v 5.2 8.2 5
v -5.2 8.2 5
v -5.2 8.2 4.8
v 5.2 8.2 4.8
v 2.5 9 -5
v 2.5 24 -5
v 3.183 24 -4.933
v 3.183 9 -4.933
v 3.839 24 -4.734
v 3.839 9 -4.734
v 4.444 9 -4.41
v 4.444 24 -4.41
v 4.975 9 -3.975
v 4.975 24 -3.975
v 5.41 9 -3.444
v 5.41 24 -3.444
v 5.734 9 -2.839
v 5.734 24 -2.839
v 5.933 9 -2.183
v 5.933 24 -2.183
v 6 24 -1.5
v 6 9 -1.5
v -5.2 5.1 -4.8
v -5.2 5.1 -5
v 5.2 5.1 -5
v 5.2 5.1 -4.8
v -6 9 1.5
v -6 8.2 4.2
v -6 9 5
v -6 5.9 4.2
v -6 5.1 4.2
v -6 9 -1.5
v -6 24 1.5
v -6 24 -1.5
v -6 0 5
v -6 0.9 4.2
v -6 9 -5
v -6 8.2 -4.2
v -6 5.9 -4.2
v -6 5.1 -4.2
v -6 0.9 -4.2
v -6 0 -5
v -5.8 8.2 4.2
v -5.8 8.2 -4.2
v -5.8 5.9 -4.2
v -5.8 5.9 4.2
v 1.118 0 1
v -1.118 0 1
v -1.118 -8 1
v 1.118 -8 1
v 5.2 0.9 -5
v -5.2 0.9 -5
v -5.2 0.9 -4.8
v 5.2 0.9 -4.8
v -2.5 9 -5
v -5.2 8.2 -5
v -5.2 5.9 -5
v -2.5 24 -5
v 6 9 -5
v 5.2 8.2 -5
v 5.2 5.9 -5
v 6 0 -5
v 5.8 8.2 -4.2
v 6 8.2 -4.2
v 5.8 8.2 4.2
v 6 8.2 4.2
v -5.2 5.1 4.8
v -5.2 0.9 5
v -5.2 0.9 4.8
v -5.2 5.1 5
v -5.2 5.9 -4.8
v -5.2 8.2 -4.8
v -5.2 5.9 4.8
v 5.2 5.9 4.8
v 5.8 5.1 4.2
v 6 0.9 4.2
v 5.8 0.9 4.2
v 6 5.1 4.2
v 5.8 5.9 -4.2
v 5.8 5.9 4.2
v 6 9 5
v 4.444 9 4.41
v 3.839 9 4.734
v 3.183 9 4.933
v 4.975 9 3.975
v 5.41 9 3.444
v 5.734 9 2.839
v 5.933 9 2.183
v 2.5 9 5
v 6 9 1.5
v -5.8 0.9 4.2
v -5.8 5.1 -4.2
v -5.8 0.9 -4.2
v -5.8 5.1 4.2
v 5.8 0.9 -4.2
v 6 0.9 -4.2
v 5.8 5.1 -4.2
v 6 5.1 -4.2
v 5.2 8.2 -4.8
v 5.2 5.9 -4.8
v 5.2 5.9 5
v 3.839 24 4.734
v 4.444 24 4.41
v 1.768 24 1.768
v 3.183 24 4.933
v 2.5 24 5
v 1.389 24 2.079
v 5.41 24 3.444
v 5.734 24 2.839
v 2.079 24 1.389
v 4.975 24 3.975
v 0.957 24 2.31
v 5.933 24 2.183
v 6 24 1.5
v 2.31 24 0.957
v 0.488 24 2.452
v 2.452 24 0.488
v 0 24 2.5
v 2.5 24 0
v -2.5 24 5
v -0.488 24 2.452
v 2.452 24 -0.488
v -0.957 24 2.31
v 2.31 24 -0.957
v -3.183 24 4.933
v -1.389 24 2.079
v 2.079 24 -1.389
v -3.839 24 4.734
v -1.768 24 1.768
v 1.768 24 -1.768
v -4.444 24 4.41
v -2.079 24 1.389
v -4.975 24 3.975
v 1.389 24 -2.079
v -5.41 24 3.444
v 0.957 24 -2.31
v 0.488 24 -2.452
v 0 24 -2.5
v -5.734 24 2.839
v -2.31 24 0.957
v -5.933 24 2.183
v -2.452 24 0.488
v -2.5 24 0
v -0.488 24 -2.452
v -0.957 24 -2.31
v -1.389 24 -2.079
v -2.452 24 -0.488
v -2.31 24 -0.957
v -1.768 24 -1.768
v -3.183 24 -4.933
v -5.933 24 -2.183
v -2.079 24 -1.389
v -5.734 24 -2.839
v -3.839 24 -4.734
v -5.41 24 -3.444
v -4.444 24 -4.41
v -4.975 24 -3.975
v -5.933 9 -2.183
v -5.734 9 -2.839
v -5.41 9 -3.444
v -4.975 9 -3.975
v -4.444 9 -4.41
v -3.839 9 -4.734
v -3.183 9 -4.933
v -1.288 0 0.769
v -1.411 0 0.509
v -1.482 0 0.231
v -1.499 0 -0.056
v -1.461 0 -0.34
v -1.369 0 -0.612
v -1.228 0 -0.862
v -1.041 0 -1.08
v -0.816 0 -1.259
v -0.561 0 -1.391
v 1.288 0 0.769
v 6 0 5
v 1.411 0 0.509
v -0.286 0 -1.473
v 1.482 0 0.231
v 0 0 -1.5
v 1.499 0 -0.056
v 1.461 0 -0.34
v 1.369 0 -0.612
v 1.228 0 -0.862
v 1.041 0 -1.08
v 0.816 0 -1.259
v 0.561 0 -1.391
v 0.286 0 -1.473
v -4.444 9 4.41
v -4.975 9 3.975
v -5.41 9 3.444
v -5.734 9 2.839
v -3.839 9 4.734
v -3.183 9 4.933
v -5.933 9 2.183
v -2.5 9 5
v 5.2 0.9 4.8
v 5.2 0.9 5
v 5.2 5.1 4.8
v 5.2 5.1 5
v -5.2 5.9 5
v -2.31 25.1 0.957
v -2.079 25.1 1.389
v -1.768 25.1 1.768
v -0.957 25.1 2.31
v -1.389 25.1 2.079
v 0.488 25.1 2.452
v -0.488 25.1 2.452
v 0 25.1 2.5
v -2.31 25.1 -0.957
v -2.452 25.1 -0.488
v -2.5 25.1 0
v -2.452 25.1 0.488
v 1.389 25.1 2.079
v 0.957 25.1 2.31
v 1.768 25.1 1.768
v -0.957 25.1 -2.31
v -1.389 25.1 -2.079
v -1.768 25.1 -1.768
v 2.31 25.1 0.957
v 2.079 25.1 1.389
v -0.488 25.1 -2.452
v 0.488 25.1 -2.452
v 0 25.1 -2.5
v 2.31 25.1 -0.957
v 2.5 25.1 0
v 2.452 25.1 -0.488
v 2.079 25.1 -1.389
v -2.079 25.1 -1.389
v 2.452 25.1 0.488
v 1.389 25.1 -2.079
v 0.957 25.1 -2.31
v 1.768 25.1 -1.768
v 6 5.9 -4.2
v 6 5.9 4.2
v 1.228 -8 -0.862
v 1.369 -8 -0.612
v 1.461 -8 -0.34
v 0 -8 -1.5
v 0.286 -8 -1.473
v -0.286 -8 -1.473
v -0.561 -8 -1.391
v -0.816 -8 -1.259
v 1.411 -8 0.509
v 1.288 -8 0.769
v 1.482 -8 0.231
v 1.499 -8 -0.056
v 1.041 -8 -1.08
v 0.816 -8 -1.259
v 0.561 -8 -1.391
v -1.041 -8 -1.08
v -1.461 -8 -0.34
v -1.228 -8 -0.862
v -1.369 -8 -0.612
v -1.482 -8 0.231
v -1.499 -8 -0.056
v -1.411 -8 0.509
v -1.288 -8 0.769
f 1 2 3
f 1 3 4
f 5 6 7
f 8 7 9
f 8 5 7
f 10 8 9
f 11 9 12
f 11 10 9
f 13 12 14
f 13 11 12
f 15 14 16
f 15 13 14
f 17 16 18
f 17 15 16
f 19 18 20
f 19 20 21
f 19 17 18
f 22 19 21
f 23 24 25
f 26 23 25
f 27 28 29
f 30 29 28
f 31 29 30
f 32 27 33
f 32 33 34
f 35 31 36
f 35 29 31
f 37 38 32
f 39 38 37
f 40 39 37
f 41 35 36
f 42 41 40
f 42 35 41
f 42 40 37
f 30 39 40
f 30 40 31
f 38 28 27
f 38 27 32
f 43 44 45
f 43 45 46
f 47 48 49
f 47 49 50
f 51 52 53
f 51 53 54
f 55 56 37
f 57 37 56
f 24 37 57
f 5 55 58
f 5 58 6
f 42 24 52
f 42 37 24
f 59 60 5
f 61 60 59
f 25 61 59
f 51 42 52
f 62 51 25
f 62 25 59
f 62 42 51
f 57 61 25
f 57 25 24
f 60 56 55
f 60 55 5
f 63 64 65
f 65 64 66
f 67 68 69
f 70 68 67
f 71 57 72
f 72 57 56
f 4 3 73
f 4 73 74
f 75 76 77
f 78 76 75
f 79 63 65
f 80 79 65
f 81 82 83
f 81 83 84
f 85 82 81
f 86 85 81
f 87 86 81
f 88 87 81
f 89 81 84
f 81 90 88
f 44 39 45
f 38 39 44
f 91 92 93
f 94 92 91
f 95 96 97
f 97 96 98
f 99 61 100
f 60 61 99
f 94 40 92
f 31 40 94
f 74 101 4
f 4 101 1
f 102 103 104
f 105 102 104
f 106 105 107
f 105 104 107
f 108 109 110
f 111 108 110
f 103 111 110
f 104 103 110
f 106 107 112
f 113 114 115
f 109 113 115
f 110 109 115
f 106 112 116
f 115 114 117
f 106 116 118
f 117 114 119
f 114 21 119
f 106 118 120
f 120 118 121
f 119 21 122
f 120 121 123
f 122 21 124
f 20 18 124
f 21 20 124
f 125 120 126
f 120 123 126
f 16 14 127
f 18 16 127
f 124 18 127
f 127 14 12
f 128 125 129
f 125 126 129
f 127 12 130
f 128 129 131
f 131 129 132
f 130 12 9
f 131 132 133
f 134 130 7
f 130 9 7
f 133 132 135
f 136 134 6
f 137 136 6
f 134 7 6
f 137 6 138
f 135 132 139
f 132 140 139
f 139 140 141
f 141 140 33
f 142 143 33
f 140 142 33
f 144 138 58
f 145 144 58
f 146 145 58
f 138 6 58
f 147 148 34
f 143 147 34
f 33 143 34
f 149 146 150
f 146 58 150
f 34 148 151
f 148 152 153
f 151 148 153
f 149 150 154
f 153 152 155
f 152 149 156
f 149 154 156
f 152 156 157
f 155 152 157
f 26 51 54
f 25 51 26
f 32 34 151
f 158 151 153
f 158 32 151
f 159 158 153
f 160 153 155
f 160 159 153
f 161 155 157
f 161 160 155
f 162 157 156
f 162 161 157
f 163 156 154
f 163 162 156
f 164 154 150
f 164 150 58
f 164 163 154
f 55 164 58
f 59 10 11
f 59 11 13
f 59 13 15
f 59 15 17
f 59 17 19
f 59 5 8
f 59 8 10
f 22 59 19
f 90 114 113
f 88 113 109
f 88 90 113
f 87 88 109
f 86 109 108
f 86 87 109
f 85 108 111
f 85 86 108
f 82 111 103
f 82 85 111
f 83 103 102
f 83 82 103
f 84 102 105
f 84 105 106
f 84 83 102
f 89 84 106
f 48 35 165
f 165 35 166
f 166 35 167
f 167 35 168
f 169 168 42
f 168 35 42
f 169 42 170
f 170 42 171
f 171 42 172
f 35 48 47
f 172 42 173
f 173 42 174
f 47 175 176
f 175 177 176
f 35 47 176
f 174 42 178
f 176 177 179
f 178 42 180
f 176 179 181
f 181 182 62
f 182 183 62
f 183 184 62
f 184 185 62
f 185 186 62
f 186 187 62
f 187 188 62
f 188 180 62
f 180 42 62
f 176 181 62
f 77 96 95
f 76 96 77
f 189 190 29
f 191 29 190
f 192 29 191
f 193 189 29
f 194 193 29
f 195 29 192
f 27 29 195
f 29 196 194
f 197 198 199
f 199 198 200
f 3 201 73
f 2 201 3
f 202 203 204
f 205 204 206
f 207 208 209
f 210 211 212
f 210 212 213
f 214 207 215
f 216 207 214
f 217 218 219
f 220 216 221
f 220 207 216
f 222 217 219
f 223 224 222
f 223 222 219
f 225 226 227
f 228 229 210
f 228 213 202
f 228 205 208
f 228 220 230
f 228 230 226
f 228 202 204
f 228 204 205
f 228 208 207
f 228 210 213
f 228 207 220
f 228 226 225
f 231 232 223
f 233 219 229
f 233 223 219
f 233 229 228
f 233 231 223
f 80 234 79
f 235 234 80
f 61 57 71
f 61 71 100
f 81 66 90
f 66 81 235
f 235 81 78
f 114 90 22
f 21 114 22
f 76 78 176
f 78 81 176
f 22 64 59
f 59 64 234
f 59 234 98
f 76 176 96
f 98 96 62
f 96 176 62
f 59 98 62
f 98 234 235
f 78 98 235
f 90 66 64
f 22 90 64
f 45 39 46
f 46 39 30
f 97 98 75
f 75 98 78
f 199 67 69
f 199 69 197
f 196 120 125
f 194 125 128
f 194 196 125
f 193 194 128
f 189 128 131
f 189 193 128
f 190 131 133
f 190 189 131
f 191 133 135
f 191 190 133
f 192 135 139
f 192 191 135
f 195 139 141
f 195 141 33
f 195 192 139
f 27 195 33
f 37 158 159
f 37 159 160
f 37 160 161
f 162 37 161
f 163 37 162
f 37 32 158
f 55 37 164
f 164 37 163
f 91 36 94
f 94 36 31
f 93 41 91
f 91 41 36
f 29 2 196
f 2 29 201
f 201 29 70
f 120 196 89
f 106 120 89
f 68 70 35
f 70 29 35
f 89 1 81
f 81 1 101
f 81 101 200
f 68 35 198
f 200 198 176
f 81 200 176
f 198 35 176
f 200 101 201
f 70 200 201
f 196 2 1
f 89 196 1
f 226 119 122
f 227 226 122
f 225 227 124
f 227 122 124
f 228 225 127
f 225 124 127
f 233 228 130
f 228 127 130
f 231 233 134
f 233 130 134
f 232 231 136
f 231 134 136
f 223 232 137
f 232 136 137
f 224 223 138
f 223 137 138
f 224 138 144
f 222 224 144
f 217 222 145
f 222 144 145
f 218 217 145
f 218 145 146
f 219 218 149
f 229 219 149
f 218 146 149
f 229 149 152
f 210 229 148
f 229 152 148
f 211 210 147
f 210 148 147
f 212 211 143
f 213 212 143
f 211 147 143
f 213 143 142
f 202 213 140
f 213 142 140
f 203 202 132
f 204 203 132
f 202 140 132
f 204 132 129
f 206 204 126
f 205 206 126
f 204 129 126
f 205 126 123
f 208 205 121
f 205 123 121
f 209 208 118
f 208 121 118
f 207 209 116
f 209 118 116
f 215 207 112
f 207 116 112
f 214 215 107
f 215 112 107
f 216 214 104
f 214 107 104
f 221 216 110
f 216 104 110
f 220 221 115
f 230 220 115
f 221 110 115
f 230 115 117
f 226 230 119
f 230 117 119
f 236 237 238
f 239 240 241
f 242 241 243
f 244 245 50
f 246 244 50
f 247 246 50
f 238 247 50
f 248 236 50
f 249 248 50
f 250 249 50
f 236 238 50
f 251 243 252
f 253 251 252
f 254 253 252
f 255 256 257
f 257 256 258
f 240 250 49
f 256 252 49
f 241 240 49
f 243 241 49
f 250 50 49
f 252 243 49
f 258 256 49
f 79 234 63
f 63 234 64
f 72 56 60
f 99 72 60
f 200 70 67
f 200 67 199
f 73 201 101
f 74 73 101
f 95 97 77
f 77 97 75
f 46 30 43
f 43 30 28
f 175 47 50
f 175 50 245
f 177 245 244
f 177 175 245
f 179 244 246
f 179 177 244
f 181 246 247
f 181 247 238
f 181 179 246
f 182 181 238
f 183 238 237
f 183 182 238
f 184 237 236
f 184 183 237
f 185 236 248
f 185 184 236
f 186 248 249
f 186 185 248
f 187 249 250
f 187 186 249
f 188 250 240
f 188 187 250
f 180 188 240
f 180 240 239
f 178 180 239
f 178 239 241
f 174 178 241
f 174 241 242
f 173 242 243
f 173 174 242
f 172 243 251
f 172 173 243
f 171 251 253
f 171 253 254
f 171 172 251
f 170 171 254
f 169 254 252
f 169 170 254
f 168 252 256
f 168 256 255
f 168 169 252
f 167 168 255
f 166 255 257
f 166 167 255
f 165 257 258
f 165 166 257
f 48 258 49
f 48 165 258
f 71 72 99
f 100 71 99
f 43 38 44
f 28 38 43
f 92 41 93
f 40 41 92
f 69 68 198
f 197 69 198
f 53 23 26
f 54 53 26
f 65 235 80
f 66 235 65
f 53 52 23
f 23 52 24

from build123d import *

# Parameters (mm, degrees)
SKETCH1_W           = 12
SKETCH1_H           = 10
BOSS_EXTRUDE1_DEPTH = 9
BOSS_EXTRUDE2_DEPTH = 15
SKETCH3_R           = 2.5
BOSS_EXTRUDE3_DEPTH = 1.1
BOSS_EXTRUDE4_DEPTH = 8
SKETCH5_W           = 10.4
SKETCH5_H           = 2.3
SKETCH5_H_2         = 4.2
CUT_EXTRUDE1_DEPTH  = 0.2
SKETCH6_W           = 8.4
SKETCH6_H           = 2.3
SKETCH6_H_2         = 4.2
CUT_EXTRUDE2_DEPTH  = 0.2


with BuildPart() as part:
    # Sketch1 → Boss-Extrude1 (new body)
    with BuildSketch(Plane(origin=(0, 0, 0), x_dir=(1, 0, 0), z_dir=(0, 1, 0))):
        Rectangle(SKETCH1_W, SKETCH1_H)
    extrude(amount=BOSS_EXTRUDE1_DEPTH)

    # Sketch2 → Boss-Extrude2 (add)
    with BuildSketch(Plane(origin=(0, 9, 0), x_dir=(1, 0, 0), z_dir=(0, 1, 0))):
        with BuildLine():
            Line((-2.5, 5), (2.5, 5))
            ThreePointArc((2.5, 5), (4.974873734, 3.974873734), (6, 1.5))
            Line((6, 1.5), (6, -1.5))
            ThreePointArc((6, -1.5), (4.974873734, -3.974873734), (2.5, -5))
            Line((2.5, -5), (-2.5, -5))
            ThreePointArc((-2.5, -5), (-4.974873734, -3.974873734), (-6, -1.5))
            Line((-6, -1.5), (-6, 1.5))
            ThreePointArc((-6, 1.5), (-4.974873734, 3.974873734), (-2.5, 5))
        make_face()
    extrude(amount=BOSS_EXTRUDE2_DEPTH)

    # Sketch3 → Boss-Extrude3 (add)
    with BuildSketch(Plane(origin=(0, 24, 0), x_dir=(1, 0, 0), z_dir=(0, 1, 0))):
        Circle(SKETCH3_R)
    extrude(amount=BOSS_EXTRUDE3_DEPTH)

    # Sketch4 → Boss-Extrude4 (add)
    with BuildSketch(Plane.XZ):
        with BuildLine():
            Line((-1.118033989, 1), (1.118033989, 1))
            ThreePointArc((1.118033989, 1), (0, -1.5), (-1.118033989, 1))
        make_face()
    extrude(amount=BOSS_EXTRUDE4_DEPTH)

    # Sketch5 → Cut-Extrude1 (cut)
    with BuildSketch(Plane.XY.offset(5)):
        with Locations((0, 7.05)):
            Rectangle(SKETCH5_W, SKETCH5_H)
        with Locations((0, 3)):
            Rectangle(SKETCH5_W, SKETCH5_H_2)
    cut_extrude1 = extrude(amount=-CUT_EXTRUDE1_DEPTH, mode=Mode.SUBTRACT)

    # Mirror1: Cut-Extrude1 across plane
    add(cut_extrude1.mirror(Plane.XY), mode=Mode.SUBTRACT)

    # Sketch6 → Cut-Extrude2 (cut)
    with BuildSketch(Plane.ZY.offset(6)):
        with Locations((0, 7.05)):
            Rectangle(SKETCH6_W, SKETCH6_H)
        with Locations((0, 3)):
            Rectangle(SKETCH6_W, SKETCH6_H_2)
    cut_extrude2 = extrude(amount=-CUT_EXTRUDE2_DEPTH, mode=Mode.SUBTRACT)

    # Mirror2: Cut-Extrude2 across plane
    add(cut_extrude2.mirror(Plane(origin=(0, 0, 0), x_dir=(0, 0, 1), z_dir=(1, 0, 0))), mode=Mode.SUBTRACT)


solid = part.part
